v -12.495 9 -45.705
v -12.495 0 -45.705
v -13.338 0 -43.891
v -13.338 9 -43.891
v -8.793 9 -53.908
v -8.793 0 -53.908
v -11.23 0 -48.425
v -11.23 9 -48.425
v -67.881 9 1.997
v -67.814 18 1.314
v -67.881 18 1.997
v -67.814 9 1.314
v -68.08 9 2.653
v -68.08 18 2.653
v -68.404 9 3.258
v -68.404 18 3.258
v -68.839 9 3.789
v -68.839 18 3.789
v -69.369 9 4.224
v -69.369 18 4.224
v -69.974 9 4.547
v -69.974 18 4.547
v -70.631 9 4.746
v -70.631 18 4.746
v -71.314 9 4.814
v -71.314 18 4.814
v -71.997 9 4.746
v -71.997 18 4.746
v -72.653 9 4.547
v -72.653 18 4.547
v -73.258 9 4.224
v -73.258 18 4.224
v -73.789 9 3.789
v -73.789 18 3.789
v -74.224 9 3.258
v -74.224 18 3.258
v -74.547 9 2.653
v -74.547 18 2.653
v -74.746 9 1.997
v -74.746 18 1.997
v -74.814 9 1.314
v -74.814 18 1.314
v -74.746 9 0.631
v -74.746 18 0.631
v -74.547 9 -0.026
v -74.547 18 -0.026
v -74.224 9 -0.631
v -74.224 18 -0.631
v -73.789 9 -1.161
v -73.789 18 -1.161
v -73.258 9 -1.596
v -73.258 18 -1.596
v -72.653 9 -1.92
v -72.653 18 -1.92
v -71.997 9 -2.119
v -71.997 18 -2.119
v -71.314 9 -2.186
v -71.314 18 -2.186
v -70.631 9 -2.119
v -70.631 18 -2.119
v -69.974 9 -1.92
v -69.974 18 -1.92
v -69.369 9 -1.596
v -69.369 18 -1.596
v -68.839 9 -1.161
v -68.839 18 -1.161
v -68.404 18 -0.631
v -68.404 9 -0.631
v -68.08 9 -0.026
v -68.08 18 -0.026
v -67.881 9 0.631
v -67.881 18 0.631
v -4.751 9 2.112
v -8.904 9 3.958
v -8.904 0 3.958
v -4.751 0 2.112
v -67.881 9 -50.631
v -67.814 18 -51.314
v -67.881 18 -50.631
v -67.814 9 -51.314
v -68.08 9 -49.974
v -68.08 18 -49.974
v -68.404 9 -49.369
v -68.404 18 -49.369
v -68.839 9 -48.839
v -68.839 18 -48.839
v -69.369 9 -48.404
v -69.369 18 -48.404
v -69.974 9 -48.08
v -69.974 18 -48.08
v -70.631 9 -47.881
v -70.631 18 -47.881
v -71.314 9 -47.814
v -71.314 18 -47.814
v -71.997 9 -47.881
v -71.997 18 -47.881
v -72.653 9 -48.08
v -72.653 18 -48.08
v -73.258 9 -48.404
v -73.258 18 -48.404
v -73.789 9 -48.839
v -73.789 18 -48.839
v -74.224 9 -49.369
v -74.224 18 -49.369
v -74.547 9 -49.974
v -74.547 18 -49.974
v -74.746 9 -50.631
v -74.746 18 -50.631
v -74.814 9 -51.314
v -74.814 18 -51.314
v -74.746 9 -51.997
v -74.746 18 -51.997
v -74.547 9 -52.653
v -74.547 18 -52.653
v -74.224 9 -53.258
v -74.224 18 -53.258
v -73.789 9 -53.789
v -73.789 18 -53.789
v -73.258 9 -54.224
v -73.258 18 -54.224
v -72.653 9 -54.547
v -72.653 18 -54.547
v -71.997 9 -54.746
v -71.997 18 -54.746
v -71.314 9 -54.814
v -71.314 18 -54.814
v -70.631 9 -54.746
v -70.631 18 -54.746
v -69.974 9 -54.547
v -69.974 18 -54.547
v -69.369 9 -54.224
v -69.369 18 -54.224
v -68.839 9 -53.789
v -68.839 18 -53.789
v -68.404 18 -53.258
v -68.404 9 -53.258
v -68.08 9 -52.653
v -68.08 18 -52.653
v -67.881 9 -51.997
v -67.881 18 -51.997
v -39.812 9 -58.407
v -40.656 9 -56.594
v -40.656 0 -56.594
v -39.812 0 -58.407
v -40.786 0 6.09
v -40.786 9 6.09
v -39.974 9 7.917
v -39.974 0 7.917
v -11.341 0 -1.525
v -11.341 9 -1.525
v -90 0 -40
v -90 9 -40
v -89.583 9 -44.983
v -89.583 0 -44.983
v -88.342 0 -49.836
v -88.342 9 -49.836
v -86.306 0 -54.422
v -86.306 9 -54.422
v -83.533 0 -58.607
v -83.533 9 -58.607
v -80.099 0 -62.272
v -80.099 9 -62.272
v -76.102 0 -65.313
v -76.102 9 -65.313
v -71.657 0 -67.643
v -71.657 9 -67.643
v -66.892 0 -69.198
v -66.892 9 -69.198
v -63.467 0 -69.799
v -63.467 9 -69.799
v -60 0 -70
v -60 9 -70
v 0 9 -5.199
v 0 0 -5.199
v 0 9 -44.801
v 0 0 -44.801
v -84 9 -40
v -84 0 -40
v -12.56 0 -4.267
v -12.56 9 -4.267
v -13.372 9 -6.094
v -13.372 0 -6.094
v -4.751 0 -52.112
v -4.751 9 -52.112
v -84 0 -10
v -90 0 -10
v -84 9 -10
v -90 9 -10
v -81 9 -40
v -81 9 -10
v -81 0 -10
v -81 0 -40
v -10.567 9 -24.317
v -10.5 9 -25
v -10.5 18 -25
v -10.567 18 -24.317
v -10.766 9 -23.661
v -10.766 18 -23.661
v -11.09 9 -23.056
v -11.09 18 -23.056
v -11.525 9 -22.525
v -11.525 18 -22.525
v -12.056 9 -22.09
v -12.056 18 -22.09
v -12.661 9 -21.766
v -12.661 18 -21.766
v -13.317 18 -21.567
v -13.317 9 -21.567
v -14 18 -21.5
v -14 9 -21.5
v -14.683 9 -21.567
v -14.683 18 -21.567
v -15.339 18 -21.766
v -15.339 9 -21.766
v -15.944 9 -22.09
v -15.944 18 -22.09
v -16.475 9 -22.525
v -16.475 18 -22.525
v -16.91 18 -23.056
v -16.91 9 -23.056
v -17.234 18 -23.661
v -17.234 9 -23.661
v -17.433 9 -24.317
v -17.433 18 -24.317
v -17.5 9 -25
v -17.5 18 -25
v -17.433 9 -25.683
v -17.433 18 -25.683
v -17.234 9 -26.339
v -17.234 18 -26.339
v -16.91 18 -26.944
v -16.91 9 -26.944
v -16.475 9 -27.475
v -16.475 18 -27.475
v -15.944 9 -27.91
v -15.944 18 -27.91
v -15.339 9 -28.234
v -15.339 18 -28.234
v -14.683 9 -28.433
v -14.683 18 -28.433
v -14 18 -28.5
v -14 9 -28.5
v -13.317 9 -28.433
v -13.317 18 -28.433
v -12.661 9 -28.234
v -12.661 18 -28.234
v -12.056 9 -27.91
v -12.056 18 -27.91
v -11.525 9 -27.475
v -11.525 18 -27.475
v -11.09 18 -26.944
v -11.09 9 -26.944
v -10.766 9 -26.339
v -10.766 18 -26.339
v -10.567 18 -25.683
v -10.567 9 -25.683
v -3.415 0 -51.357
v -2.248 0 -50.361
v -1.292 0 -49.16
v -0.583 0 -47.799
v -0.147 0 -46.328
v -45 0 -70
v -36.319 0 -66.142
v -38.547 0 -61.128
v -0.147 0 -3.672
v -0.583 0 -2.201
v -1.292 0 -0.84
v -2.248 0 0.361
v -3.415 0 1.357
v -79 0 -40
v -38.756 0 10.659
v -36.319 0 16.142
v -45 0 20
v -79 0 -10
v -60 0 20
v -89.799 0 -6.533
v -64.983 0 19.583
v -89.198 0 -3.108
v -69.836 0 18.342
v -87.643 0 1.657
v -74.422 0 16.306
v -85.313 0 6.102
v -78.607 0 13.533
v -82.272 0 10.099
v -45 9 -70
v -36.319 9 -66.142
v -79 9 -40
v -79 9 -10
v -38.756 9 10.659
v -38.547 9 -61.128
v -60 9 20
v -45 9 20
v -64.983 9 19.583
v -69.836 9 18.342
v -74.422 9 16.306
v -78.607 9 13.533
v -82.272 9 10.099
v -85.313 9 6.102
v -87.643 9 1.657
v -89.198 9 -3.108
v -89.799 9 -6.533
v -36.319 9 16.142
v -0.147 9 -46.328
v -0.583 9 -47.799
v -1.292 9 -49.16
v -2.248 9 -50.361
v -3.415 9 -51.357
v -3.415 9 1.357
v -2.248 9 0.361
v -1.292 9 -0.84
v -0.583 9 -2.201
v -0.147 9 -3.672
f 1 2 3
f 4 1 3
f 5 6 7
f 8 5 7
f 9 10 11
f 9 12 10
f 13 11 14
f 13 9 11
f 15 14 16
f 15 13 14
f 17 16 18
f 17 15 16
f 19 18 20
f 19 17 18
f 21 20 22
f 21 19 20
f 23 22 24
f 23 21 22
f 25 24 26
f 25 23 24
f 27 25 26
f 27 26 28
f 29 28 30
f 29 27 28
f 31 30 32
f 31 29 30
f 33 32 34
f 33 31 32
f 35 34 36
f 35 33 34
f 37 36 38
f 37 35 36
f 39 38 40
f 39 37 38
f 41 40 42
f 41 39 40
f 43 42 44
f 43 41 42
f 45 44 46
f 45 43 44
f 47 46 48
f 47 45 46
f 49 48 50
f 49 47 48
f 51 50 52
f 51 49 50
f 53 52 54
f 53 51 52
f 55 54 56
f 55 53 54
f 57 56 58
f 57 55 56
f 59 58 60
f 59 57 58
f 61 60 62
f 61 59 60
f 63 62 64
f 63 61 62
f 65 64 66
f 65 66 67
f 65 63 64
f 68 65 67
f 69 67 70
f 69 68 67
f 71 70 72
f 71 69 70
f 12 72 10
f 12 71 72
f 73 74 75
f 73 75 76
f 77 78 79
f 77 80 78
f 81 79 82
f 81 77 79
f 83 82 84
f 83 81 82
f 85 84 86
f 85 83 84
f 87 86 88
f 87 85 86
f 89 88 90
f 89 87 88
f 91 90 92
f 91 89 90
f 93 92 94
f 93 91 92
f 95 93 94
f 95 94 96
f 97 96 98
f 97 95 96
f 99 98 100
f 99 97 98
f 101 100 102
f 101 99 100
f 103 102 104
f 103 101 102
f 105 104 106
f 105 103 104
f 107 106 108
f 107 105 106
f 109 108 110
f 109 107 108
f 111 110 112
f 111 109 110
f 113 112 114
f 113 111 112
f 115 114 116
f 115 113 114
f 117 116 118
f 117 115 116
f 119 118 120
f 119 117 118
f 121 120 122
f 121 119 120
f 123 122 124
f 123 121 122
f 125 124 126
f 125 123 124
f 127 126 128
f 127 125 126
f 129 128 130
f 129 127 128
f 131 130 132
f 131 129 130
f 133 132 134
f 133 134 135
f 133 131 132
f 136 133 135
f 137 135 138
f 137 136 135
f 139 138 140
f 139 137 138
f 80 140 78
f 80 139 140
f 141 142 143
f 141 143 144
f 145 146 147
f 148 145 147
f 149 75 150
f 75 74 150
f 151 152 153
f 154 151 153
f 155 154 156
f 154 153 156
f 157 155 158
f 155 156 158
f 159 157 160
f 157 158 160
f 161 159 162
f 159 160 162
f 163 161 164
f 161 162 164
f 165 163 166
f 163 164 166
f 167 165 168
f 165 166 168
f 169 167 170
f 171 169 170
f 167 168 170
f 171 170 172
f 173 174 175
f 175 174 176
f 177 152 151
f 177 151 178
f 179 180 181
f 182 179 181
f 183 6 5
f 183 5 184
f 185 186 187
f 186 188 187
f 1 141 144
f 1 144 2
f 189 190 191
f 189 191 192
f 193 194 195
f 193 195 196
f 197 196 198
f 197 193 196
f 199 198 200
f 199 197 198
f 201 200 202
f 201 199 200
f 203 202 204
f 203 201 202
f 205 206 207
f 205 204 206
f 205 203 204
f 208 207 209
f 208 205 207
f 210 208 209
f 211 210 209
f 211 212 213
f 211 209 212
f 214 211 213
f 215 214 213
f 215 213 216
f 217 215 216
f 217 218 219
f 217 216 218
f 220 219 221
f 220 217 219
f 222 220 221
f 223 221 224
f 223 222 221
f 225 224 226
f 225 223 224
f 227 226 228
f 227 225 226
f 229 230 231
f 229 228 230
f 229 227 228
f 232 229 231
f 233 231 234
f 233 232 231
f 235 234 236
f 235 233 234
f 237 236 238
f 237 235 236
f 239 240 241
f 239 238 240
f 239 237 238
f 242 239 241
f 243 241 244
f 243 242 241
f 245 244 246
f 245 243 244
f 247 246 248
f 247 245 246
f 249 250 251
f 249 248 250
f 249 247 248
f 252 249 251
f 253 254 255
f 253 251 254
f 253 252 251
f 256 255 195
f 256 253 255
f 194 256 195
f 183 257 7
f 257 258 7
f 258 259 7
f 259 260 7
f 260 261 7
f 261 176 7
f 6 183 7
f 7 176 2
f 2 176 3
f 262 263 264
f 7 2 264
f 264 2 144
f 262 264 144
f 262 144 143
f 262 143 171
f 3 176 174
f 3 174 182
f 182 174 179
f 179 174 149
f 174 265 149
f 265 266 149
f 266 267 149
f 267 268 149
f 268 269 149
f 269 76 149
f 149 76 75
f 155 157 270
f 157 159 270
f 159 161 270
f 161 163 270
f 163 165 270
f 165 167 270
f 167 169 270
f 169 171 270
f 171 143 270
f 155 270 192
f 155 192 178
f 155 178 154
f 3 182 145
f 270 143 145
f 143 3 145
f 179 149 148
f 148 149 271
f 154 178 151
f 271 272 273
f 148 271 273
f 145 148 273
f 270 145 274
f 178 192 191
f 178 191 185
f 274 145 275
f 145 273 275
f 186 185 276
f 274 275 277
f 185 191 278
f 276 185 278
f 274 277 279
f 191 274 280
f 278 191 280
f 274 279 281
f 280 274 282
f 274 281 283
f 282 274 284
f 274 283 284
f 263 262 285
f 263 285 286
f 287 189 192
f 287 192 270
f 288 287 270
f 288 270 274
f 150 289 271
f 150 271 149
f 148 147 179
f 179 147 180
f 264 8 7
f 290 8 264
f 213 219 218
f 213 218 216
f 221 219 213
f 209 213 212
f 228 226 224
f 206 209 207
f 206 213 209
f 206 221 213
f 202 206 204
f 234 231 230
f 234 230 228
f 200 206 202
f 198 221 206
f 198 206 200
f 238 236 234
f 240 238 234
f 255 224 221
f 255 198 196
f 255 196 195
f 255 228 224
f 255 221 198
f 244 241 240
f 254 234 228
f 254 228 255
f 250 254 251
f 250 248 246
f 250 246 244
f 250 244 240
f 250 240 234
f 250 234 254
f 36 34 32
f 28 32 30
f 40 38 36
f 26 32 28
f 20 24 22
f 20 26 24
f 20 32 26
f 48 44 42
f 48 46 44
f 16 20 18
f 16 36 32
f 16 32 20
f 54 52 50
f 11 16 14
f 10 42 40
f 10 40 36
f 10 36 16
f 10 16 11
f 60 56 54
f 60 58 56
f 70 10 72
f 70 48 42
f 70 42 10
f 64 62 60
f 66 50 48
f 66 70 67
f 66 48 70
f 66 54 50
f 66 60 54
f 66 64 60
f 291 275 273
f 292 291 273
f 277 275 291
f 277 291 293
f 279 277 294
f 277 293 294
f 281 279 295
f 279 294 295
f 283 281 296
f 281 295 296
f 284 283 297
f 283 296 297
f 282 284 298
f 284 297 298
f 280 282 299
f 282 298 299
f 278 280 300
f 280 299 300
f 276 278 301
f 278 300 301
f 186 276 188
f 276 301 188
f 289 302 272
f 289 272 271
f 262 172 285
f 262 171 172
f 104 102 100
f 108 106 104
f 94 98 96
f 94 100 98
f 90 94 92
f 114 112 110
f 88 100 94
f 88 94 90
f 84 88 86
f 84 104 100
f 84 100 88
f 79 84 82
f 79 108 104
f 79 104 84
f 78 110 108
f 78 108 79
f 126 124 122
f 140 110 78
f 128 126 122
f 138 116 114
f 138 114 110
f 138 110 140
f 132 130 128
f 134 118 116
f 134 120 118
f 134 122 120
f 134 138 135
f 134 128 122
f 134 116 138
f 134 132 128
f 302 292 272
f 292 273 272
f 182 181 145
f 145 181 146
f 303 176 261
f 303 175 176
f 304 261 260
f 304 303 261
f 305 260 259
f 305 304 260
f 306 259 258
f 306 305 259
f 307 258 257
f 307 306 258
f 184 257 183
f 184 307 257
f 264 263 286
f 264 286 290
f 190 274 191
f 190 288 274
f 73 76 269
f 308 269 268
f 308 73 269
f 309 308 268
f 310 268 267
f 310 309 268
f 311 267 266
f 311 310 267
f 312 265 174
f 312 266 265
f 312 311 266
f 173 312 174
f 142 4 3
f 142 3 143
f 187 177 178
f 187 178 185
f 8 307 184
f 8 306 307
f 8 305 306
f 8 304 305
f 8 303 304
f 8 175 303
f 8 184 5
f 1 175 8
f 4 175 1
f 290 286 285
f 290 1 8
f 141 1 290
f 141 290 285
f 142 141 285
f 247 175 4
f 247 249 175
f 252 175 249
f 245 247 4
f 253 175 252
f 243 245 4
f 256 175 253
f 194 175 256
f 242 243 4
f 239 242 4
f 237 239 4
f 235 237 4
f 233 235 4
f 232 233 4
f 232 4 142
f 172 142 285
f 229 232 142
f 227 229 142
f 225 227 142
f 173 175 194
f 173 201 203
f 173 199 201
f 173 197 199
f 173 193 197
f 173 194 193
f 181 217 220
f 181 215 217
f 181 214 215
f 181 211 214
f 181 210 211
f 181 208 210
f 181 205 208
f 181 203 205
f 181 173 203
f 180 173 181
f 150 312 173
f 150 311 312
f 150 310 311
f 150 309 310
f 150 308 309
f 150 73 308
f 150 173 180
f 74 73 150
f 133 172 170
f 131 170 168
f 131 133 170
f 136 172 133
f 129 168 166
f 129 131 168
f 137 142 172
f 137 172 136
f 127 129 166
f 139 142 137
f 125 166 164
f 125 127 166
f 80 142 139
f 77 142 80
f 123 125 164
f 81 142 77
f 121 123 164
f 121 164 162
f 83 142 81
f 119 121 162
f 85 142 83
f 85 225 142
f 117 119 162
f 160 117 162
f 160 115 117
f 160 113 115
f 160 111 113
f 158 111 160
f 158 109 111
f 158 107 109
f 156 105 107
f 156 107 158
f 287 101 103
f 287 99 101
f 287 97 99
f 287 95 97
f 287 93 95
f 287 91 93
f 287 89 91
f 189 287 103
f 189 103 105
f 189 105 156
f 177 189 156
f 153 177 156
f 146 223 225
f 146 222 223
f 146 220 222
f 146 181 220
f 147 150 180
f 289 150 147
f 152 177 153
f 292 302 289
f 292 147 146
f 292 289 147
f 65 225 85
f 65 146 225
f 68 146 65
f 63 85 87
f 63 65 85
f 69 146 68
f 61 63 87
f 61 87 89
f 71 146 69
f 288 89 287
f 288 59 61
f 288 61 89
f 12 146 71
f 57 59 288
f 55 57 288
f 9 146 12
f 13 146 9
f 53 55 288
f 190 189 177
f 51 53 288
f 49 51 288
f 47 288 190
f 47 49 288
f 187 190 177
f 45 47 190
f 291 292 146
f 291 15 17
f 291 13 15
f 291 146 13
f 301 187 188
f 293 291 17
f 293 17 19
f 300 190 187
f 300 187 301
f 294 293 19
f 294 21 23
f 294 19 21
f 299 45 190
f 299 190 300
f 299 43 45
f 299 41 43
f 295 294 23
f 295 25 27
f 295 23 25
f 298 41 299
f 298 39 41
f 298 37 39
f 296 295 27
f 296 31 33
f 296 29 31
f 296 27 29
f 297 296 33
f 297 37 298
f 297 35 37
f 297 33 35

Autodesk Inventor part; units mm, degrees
ref_plane "YZ Plane" through (0, 0, 0) normal (1, 0, 0) x (0, 1, 0)
ref_plane "XZ Plane" through (0, 0, 0) normal (0, 1, 0) x (-1, 0, 0)
ref_plane "XY Plane" through (0, 0, 0) normal (0, 0, 1) x (1, 0, 0)
sketch "Sketch1" plane through (0, 0, 0) normal (0, 1, 0) x (-1, 0, 0)
  line L0 (0, 0) -> (0, -50)
  line L1 (90, -50) -> (90, 0)
  line L2 (90, -25) -> (90, -70)
  line L3 (90, -25) -> (90, 20)
  line L4 (90, 20) -> (60, 20)
  line L5 (90, -70) -> (60, -70)
  line L6 (60, 20) -> (45, 20)
  line L7 (60, -70) -> (45, -70)
  line L8 (45, -70) -> (0, -50)
  line L9 (45, 20) -> (0, 0)
extrude "Extrusion1" add sketch "Sketch1" along normal blind 9
fillet "Fillet1" radius 30 2 edges at (-90, 4.5, 20) (-90, 4.5, -70)
sketch "Sketch2" plane through (0, 9, 0) normal (0, 1, 0) x (1, 0, 0)
  arc A0 (-90, 10) -> (-60, -20) centre (-60, 10) ccw projected
  line L0 (-90, 10) -> (-84, 10)
  line L1 (-90, 40) -> (-90, 10) projected
  line L2 (-90, 40) -> (-84, 40)
  line L3 (-84, 40) -> (-84, 10)
  line L4 (-45, -20) -> (0, 0) projected
  line L5 (-45, -20) -> (-22.6116, -10.0496)
  line L6 (-22.6116, -10.0496) -> (-36.3188, -16.1417)
  line L7 (-22.6116, -10.0496) -> (-8.9044, -3.9575)
  line L8 (-8.9044, -3.9575) -> (-11.3413, 1.5253)
  line L9 (-36.3188, -16.1417) -> (-38.7556, -10.6588)
  line L10 (-38.7556, -10.6588) -> (-11.3413, 1.5253)
  line L11 (0, 50) -> (-45, 70) projected
  line L12 (-45, 70) -> (-22.6116, 60.0496)
  line L13 (-22.6116, 60.0496) -> (-36.3188, 66.1417)
  line L14 (-36.3188, 66.1417) -> (-38.7556, 60.6588)
  line L15 (-22.5, 60) -> (-8.7928, 53.9079)
  line L16 (-8.7928, 53.9079) -> (-11.2297, 48.4251)
  line L17 (-11.2297, 48.4251) -> (-38.5472, 61.1277)
  dimension "d11" = 6
extrude "Extrusion2" cut sketch "Sketch2" against normal blind 9
fillet "Fillet2" radius 8 2 edges at (0, 4.5, 0) (0, 4.5, -50)
sketch "Sketch3" plane through (0, 9, 0) normal (0, 1, 0) x (1, 0, 0)
  line L0 (-84, 40) -> (-84, 10) projected
  line L1 (-81, 10) -> (-81, 40)
  line L2 (-81, 40) -> (-79, 40)
  line L3 (-79, 40) -> (-79, 10)
  line L4 (-79, 10) -> (-81, 10)
  line L5 (-36.3188, -16.1417) -> (-38.7556, -10.6588) projected
  line L6 (-39.974, -7.9174) -> (-12.5597, 4.2668)
  line L7 (-12.5597, 4.2668) -> (-13.372, 6.0944)
  line L8 (-13.372, 6.0944) -> (-40.7863, -6.0898)
  line L9 (-40.7863, -6.0898) -> (-39.974, -7.9174)
  line L10 (-38.5472, 61.1277) -> (-38.7617, 60.6665)
  line L11 (-11.2297, 48.4251) -> (-38.5472, 61.1277) projected
  line L12 (-39.8122, 58.4074) -> (-12.4946, 45.7048)
  line L13 (-12.4946, 45.7048) -> (-13.3379, 43.8912)
  line L14 (-13.3379, 43.8912) -> (-40.6555, 56.5938)
  line L15 (-40.6555, 56.5938) -> (-39.8122, 58.4074)
  point P0 (0, 0)
extrude "Extrusion3" cut sketch "Sketch3" against normal blind 9
sketch "Sketch4" plane through (0, 9, 0) normal (0, 1, 0) x (1, 0, 0)
  arc A0 (-90, 10) -> (-60, -20) centre (-60, 10) ccw projected
  line L0 (-60, 10) -> (-81.2132, -11.2132)
  line L1 (-60, 10) -> (-30, 10) construction
  arc A1 (-60, 70) -> (-90, 40) centre (-60, 40) ccw projected
  line L2 (-60, 40) -> (-78.753, 58.753)
  line L3 (-60, 40) -> (-33.4792, 40) construction
  line L4 (0, 5.199) -> (0, 44.801) projected
  line L5 (0, 25) -> (-14, 25)
  line L6 (-81.2132, -11.2132) -> (-71.3137, -1.3137)
  line L7 (-81.2132, 61.2132) -> (-71.3137, 51.3137)
  circle A2 centre (-71.3137, -1.3137) radius 3.5
  circle A3 centre (-71.3137, 51.3137) radius 3.5
  circle A4 centre (-14, 25) radius 3.5
  point P0 (0, 0)
  dimension "d38" = 7
  dimension "d39" = 7
  dimension "d40" = 7
extrude "Extrusion4" add sketch "Sketch4" along normal blind 9
sketch "Sketch5" plane through (0, 0, 0) normal (0, -1, 0) x (1, 0, 0)
  point P0 (0, 0)
properties part number "palm"
